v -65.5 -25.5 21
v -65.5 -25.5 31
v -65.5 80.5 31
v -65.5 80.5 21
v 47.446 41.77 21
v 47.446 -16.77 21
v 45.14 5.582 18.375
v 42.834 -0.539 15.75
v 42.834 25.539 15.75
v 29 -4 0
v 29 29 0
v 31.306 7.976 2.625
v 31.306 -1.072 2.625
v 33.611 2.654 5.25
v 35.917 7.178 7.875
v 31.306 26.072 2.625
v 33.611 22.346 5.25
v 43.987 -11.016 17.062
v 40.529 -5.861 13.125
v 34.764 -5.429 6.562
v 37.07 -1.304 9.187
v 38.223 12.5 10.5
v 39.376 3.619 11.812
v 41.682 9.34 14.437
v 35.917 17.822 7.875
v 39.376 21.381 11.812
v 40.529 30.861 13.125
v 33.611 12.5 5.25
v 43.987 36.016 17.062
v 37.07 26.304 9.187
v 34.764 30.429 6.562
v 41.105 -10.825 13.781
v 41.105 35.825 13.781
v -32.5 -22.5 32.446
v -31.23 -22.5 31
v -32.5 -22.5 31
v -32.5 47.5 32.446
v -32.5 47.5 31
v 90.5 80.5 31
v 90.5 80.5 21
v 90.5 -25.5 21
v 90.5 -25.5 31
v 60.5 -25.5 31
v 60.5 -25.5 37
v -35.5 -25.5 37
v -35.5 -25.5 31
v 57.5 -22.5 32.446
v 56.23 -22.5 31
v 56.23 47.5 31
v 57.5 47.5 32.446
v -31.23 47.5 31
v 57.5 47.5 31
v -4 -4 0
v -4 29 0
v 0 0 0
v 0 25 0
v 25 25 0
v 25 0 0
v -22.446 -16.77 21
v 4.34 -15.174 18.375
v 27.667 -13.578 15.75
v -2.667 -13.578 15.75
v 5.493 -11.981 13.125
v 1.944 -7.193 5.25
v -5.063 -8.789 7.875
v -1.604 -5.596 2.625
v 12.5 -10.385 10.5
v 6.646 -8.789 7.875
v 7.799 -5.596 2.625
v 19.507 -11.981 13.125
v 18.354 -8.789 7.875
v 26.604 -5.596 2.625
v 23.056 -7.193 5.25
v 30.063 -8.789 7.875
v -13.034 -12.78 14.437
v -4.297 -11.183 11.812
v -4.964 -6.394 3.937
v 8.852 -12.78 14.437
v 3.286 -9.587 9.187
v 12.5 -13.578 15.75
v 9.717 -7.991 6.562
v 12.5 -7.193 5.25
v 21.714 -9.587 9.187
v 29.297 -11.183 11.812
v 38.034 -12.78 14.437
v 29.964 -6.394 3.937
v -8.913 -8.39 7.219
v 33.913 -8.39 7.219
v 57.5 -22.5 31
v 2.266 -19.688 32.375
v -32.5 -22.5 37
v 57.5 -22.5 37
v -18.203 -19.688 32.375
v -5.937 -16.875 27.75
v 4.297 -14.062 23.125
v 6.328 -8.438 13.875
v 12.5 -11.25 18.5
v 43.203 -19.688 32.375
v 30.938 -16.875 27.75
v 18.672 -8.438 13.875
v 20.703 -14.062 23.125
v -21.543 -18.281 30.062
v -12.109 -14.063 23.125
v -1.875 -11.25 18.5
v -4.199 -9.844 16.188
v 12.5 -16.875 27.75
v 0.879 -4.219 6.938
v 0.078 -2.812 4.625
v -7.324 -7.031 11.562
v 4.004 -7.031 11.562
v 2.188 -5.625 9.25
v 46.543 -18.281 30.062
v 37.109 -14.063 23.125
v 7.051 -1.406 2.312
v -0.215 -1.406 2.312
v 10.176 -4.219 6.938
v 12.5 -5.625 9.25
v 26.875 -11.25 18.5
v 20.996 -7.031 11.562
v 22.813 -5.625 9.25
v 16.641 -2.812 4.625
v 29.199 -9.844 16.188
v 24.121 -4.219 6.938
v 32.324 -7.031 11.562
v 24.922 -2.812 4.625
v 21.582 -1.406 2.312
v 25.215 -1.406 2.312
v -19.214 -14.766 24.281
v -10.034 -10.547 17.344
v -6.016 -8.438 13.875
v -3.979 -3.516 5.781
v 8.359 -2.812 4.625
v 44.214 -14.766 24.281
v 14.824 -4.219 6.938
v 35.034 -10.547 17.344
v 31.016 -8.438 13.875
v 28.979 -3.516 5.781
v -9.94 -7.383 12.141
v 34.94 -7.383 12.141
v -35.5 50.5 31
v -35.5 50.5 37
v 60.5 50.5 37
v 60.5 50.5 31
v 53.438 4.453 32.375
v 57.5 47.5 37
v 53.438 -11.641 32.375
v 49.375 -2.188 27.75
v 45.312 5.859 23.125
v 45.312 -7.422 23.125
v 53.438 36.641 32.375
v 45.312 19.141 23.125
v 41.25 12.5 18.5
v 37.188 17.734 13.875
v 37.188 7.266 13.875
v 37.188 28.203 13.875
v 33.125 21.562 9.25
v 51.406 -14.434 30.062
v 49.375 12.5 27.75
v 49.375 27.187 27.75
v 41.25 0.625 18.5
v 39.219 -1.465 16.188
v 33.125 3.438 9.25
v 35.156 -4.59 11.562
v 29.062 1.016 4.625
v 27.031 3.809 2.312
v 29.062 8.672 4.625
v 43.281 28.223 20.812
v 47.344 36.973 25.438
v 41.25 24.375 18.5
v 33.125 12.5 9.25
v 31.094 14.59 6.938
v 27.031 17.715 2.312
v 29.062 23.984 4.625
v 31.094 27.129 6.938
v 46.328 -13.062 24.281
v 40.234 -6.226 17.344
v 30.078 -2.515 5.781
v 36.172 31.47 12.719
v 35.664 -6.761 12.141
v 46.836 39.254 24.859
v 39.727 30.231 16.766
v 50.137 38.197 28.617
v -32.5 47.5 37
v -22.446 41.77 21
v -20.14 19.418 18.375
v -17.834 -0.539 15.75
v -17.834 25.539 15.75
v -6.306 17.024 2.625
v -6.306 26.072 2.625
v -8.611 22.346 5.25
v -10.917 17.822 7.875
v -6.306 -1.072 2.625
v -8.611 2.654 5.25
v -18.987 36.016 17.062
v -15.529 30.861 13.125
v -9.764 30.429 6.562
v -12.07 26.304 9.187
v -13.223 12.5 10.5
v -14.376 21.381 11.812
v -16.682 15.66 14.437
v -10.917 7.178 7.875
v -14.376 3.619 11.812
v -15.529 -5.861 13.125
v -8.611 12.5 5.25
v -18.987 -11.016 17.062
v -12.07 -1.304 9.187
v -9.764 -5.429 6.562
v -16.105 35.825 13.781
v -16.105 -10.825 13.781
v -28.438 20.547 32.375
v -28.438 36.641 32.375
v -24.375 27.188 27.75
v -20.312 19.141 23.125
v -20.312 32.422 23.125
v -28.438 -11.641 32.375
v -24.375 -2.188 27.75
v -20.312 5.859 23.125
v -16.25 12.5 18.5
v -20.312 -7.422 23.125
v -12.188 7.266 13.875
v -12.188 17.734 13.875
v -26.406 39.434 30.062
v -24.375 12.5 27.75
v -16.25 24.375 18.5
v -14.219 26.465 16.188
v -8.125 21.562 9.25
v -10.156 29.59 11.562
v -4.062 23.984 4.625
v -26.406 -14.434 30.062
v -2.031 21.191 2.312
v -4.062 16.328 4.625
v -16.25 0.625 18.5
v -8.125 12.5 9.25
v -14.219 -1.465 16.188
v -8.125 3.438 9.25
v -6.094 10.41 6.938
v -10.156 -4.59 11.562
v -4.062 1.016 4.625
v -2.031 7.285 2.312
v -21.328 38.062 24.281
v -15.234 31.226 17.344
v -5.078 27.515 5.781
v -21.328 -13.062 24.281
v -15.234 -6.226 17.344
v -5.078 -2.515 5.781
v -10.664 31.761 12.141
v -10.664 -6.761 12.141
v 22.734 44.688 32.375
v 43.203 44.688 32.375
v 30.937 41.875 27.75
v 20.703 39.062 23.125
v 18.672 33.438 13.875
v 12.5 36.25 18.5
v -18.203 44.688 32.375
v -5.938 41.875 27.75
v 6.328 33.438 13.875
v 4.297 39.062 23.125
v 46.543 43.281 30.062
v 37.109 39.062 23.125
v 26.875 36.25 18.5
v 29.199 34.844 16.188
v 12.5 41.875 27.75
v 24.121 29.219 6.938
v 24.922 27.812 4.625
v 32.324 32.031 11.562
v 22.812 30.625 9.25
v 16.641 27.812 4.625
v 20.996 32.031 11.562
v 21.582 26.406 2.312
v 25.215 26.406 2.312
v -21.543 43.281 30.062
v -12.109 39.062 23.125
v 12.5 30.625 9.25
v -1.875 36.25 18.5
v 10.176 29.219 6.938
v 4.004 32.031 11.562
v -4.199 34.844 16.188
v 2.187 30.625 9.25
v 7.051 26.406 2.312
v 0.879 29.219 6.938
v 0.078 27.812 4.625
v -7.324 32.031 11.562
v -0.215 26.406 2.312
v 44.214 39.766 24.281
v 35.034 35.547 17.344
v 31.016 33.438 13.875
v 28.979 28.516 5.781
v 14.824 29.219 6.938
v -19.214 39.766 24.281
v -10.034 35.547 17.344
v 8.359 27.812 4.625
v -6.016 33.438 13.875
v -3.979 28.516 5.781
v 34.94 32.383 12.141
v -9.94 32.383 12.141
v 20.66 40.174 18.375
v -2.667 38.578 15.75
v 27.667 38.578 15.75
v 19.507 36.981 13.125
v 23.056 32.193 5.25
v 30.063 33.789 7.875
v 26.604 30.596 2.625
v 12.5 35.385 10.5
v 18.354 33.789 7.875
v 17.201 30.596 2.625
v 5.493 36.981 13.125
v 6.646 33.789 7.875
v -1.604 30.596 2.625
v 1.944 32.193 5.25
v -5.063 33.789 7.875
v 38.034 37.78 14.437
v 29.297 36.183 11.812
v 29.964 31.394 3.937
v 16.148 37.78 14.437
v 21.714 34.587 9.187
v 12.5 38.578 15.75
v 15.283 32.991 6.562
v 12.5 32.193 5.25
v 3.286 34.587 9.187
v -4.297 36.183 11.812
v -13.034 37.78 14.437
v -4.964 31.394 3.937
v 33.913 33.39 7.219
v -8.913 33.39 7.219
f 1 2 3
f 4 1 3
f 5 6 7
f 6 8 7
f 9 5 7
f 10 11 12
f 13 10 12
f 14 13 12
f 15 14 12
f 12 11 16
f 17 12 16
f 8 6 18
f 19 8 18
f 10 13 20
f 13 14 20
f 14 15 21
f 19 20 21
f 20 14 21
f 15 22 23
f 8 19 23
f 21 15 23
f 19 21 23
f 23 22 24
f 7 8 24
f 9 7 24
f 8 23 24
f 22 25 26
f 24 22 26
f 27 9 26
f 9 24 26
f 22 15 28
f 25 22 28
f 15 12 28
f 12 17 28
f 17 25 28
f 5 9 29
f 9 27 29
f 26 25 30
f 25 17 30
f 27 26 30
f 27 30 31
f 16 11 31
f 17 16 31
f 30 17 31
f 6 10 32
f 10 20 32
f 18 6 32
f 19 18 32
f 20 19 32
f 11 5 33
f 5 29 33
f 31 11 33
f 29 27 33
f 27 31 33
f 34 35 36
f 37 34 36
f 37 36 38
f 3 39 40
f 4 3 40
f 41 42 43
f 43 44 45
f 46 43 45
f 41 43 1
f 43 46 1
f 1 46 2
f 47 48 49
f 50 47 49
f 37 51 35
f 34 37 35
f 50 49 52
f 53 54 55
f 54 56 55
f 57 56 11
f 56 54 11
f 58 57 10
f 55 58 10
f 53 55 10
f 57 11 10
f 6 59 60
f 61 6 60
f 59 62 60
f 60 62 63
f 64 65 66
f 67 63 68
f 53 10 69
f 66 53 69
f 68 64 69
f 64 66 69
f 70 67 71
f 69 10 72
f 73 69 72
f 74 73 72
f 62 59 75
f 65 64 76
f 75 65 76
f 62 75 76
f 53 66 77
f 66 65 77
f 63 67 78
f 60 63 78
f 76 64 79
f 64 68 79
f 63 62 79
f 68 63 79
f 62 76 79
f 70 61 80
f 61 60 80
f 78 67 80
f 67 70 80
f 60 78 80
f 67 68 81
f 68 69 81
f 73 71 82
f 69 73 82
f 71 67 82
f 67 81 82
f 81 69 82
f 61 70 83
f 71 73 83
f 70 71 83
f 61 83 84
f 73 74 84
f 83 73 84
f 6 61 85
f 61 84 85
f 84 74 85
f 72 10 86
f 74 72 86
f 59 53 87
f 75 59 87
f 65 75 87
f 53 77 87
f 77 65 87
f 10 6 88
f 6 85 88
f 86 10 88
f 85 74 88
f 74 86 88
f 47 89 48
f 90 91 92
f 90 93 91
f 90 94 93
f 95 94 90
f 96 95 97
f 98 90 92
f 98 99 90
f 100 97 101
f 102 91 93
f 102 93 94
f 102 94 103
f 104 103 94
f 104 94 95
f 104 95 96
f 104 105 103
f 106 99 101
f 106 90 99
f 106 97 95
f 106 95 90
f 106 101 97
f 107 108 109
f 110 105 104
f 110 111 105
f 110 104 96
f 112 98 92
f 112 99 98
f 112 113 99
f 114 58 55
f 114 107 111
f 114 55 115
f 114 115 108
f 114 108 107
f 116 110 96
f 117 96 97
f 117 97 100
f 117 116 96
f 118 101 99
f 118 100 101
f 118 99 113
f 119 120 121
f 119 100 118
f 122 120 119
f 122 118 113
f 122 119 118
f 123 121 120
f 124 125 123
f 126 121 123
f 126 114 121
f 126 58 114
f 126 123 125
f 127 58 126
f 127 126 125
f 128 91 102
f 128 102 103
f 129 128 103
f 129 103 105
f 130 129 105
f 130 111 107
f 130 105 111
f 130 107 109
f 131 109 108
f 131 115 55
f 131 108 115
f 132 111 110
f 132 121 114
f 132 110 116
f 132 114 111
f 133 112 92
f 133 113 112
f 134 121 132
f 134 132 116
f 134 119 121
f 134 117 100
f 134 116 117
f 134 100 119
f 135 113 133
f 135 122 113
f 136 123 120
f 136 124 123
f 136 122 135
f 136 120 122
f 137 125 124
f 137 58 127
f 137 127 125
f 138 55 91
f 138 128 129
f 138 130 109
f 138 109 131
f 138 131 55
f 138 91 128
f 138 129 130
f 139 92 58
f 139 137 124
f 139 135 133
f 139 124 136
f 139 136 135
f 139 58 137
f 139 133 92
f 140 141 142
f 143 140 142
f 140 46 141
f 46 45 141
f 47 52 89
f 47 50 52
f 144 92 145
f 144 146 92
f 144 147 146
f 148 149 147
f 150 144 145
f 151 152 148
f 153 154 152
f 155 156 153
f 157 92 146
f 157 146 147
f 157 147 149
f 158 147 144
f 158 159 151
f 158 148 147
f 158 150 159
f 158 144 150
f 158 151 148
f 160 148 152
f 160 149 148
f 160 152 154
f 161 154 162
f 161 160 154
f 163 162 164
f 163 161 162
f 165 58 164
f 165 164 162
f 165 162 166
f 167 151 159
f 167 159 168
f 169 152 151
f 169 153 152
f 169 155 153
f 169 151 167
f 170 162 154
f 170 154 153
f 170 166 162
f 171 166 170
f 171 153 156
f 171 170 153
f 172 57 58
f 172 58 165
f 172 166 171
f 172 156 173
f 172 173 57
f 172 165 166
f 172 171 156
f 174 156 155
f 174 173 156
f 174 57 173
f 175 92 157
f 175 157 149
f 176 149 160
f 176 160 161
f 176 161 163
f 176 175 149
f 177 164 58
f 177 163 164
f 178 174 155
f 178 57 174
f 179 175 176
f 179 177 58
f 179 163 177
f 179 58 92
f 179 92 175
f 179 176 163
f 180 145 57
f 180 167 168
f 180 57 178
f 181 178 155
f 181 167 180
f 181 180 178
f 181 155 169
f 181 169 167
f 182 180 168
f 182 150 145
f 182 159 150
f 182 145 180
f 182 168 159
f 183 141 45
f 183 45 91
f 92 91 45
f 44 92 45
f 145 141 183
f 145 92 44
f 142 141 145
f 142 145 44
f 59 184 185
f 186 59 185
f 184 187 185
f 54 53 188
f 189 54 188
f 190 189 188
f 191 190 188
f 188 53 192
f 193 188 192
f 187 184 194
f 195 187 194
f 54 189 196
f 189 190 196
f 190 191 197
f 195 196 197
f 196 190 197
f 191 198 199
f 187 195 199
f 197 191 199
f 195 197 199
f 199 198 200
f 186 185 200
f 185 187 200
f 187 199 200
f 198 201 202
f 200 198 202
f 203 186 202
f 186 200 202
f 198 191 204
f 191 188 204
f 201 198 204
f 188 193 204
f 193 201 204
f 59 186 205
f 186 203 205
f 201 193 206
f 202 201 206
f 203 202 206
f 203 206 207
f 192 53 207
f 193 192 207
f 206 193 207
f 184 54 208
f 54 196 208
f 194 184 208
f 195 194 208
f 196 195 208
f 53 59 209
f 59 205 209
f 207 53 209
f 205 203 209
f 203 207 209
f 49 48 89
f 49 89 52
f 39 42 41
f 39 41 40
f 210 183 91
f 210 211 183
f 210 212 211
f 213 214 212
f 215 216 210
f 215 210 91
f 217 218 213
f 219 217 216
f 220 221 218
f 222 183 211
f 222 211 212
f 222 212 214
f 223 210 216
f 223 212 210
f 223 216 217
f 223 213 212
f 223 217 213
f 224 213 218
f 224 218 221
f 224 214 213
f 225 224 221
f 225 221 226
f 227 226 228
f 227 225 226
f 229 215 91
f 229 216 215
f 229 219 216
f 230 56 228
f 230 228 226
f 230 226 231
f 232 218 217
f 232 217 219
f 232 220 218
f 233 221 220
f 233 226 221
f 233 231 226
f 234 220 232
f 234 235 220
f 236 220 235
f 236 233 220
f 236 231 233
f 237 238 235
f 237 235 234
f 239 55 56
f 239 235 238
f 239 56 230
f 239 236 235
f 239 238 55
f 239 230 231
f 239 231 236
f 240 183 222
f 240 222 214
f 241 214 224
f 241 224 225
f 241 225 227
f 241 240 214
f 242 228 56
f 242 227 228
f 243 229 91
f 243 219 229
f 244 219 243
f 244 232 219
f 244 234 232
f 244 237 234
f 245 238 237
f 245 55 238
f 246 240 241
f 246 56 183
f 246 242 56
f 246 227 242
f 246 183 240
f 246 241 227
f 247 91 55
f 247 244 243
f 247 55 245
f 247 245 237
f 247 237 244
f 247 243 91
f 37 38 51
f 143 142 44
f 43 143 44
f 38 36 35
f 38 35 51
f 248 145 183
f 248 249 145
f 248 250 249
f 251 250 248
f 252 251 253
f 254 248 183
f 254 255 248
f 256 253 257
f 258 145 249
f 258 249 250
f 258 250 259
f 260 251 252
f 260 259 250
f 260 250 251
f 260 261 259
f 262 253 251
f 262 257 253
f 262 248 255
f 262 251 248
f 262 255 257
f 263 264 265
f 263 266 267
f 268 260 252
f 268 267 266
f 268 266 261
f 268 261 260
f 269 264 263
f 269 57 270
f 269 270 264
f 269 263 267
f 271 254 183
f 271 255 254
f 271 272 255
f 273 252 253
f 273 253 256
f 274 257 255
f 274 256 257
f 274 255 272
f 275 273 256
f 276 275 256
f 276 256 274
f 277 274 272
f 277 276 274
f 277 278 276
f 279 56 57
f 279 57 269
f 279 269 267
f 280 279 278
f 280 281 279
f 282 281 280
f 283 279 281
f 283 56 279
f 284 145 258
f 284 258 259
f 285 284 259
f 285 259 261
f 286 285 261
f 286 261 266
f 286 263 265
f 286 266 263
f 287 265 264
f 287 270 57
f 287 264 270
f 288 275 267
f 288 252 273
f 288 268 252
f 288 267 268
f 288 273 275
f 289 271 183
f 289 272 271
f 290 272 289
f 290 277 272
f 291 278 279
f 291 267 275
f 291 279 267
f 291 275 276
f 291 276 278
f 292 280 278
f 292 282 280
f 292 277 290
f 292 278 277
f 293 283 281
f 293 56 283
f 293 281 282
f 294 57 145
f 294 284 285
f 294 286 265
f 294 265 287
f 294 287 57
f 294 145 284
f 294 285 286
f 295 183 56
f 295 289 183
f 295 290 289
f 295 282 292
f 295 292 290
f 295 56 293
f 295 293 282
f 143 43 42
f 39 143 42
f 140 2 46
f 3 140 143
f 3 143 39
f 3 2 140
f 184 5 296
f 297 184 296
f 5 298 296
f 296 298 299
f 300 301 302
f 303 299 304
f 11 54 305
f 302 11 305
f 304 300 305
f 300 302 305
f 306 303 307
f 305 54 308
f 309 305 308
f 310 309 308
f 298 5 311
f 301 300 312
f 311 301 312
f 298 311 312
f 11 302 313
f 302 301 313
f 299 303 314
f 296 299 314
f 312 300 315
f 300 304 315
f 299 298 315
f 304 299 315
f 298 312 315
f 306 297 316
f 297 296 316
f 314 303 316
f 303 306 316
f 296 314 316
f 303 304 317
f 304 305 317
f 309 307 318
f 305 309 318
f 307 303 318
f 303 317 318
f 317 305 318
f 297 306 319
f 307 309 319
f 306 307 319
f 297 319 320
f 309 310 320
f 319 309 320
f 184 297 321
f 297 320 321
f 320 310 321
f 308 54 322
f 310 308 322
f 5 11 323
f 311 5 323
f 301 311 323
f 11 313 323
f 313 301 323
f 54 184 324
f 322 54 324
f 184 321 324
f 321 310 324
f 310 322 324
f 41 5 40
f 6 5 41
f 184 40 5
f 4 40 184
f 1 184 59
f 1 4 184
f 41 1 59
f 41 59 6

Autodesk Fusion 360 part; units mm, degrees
sketch "Bottom opening" plane through (0, 0, 0) normal (0, 0, 1) x (1, 0, 0)
  line L0 (0, 0) -> (25, 0)
  line L1 (25, 0) -> (25, 25)
  line L2 (25, 25) -> (0, 25)
  line L3 (0, 25) -> (0, 0)
  line L4 (-4, 29) -> (29, 29)
  line L5 (29, 29) -> (29, -4)
  line L6 (29, -4) -> (-4, -4)
  line L7 (-4, -4) -> (-4, 29)
  dimension "d3" = 25
  dimension "d4" = 25
  dimension "d5" = 4
  dimension "d6" = 4
  dimension "d7" = 4
  dimension "d8" = 4
ref_plane "WorkPlane1" through (0, 0, 37) normal (0, 0, 1) x (1, 0, 0)
sketch "Top opening" plane through (0, 0, 37) normal (0, 0, 1) x (1, 0, 0)
  line L0 (25, 25) -> (0, 25)
  line L1 (25, 0) -> (25, 25)
  line L2 (0, 0) -> (25, 0)
  line L3 (0, 25) -> (0, 0)
  line L4 (-4, 29) -> (29, 29)
  line L5 (29, -4) -> (-4, -4)
  line L6 (29, 29) -> (29, -4)
  line L7 (-4, -4) -> (-4, 29)
  line L8 (-32.5, 47.5) -> (57.5, 47.5)
  line L9 (57.5, 47.5) -> (57.5, -22.5)
  line L10 (57.5, -22.5) -> (-32.5, -22.5)
  line L11 (-32.5, -22.5) -> (-32.5, 47.5)
  line L12 (-35.5, 50.5) -> (60.5, 50.5)
  line L13 (60.5, 50.5) -> (60.5, -25.5)
  line L14 (60.5, -25.5) -> (-35.5, -25.5)
  line L15 (-35.5, -25.5) -> (-35.5, 50.5)
  line L16 (-36.5, 51.5) -> (61.5, 51.5)
  line L17 (61.5, 51.5) -> (61.5, -26.5)
  line L18 (61.5, -26.5) -> (-36.5, -26.5)
  line L19 (-36.5, -26.5) -> (-36.5, 51.5)
  dimension "d14" = 3
  dimension "d15" = 4
  dimension "d16" = 3
  dimension "d17" = 4
  dimension "d18" = 90
  dimension "d19" = 70
  dimension "d20" = 3
  dimension "d21" = 4
  dimension "d22" = 3
  dimension "d23" = 4
  dimension "d24" = 28.5
  dimension "d25" = 28.5
  dimension "d26" = 18.5
  dimension "d27" = 18.5
loft "Loft1" add profiles "Top opening", "Bottom opening" section 1 contours L8 L9 L10 L11 | L12 L13 L14 L15 | L16 L17 L18 L19 section 2 contours L0 L1 L2 L3 | L4 L5 L6 L7
extrude "Extrude1" cut sketch "Top opening" against normal blind 6 contours L16 L17 L18 L19
sketch "Support lip" plane through (60.5, 0, 0) normal (1, 0, 0) x (0, 1, 0)
  line L0 (-25.5, 35.8615) -> (50.5, 35.8615)
  line L1 (50.5, 35.8615) -> (50.5, 37)
  line L2 (50.5, 37) -> (-25.5, 37)
  line L3 (-25.5, 37) -> (-25.5, 35.8615)
  line L4 (-25.5, 31) -> (80.5, 31)
  line L5 (80.5, 31) -> (80.5, 21)
  line L6 (80.5, 21) -> (-25.5, 21)
  line L7 (-25.5, 21) -> (-25.5, 31)
  dimension "d31" = 6
  dimension "d34" = 10
  dimension "d35" = 30
extrude "Extrude2" add sketch "Support lip" along normal blind 30 and the other way blind 126 contours L4 L5 L6 L7
loft "Loft2" cut profiles "Top opening", "Bottom opening" section 1 contours L8 L9 L10 L11 section 2 contours L0 L1 L2 L3
extrude "Extrude3" add 1 faces at (-2.5, 49.5, 37) along direction (0, 0, -1) blind 6
equation "bottom_outlet_size = 25 mm" comment "The side lengths of the bottom opening of the Smartie Hopper."
equation "hopper_wall_thickness = 4 mm" comment "The thickness of the hopper walls used for the \"loft\" function."
equation "d3 = bottom_outlet_size"
equation "d4 = bottom_outlet_size"
equation "d5 = hopper_wall_thickness"
equation "d6 = hopper_wall_thickness"
equation "d7 = hopper_wall_thickness"
equation "d8 = hopper_wall_thickness"
equation "hopper_height = 37 mm" comment "Distance between the top and bottom openings of the Smartie Hopper."
equation "d10 = hopper_height"
equation "acrylic_thickness = 3 mm" comment "Thickness of the clear acrylic panels used for the Unsorted Smarties Holder."
equation "top_outlet_width = 90 mm" comment "The width of the top opening of the Smartie Hopper."
equation "top_outlet_depth = 70 mm" comment "The depth of the top opening of the Smartie Hopper."
equation "d14 = acrylic_thickness"
equation "d15 = hopper_wall_thickness"
equation "d16 = acrylic_thickness"
equation "d17 = hopper_wall_thickness"
equation "d18 = top_outlet_width"
equation "d19 = top_outlet_depth"
equation "d20 = acrylic_thickness"
equation "d21 = hopper_wall_thickness"
equation "d22 = acrylic_thickness"
equation "d23 = hopper_wall_thickness"
equation "d24 = ( top_outlet_width - ( bottom_outlet_size + 2 * hopper_wall_thickness ) ) / 2"
equation "d26 = ( top_outlet_depth - ( bottom_outlet_size + 2 * hopper_wall_thickness ) ) / 2"
equation "MDF_thickness = 6 mm" comment "Thickness of the MDF panels used for the construction of the mini arcade game enclosure."
equation "d29 = -MDF_thickness"
equation "d31 = MDF_thickness"
equation "support_lip_width = 30 mm" comment "The depth that the suport lip should extend beneath the Colour Detection Mechanism Top Panel."
equation "support_lip_thickness = 10 mm" comment "The thickness of the support lip."
equation "d34 = support_lip_thickness"
equation "d35 = support_lip_width"
equation "d36 = support_lip_width"
equation "d38 = ( top_outlet_width + 2 * acrylic_thickness ) + support_lip_width"
equation "d40 = -MDF_thickness"
